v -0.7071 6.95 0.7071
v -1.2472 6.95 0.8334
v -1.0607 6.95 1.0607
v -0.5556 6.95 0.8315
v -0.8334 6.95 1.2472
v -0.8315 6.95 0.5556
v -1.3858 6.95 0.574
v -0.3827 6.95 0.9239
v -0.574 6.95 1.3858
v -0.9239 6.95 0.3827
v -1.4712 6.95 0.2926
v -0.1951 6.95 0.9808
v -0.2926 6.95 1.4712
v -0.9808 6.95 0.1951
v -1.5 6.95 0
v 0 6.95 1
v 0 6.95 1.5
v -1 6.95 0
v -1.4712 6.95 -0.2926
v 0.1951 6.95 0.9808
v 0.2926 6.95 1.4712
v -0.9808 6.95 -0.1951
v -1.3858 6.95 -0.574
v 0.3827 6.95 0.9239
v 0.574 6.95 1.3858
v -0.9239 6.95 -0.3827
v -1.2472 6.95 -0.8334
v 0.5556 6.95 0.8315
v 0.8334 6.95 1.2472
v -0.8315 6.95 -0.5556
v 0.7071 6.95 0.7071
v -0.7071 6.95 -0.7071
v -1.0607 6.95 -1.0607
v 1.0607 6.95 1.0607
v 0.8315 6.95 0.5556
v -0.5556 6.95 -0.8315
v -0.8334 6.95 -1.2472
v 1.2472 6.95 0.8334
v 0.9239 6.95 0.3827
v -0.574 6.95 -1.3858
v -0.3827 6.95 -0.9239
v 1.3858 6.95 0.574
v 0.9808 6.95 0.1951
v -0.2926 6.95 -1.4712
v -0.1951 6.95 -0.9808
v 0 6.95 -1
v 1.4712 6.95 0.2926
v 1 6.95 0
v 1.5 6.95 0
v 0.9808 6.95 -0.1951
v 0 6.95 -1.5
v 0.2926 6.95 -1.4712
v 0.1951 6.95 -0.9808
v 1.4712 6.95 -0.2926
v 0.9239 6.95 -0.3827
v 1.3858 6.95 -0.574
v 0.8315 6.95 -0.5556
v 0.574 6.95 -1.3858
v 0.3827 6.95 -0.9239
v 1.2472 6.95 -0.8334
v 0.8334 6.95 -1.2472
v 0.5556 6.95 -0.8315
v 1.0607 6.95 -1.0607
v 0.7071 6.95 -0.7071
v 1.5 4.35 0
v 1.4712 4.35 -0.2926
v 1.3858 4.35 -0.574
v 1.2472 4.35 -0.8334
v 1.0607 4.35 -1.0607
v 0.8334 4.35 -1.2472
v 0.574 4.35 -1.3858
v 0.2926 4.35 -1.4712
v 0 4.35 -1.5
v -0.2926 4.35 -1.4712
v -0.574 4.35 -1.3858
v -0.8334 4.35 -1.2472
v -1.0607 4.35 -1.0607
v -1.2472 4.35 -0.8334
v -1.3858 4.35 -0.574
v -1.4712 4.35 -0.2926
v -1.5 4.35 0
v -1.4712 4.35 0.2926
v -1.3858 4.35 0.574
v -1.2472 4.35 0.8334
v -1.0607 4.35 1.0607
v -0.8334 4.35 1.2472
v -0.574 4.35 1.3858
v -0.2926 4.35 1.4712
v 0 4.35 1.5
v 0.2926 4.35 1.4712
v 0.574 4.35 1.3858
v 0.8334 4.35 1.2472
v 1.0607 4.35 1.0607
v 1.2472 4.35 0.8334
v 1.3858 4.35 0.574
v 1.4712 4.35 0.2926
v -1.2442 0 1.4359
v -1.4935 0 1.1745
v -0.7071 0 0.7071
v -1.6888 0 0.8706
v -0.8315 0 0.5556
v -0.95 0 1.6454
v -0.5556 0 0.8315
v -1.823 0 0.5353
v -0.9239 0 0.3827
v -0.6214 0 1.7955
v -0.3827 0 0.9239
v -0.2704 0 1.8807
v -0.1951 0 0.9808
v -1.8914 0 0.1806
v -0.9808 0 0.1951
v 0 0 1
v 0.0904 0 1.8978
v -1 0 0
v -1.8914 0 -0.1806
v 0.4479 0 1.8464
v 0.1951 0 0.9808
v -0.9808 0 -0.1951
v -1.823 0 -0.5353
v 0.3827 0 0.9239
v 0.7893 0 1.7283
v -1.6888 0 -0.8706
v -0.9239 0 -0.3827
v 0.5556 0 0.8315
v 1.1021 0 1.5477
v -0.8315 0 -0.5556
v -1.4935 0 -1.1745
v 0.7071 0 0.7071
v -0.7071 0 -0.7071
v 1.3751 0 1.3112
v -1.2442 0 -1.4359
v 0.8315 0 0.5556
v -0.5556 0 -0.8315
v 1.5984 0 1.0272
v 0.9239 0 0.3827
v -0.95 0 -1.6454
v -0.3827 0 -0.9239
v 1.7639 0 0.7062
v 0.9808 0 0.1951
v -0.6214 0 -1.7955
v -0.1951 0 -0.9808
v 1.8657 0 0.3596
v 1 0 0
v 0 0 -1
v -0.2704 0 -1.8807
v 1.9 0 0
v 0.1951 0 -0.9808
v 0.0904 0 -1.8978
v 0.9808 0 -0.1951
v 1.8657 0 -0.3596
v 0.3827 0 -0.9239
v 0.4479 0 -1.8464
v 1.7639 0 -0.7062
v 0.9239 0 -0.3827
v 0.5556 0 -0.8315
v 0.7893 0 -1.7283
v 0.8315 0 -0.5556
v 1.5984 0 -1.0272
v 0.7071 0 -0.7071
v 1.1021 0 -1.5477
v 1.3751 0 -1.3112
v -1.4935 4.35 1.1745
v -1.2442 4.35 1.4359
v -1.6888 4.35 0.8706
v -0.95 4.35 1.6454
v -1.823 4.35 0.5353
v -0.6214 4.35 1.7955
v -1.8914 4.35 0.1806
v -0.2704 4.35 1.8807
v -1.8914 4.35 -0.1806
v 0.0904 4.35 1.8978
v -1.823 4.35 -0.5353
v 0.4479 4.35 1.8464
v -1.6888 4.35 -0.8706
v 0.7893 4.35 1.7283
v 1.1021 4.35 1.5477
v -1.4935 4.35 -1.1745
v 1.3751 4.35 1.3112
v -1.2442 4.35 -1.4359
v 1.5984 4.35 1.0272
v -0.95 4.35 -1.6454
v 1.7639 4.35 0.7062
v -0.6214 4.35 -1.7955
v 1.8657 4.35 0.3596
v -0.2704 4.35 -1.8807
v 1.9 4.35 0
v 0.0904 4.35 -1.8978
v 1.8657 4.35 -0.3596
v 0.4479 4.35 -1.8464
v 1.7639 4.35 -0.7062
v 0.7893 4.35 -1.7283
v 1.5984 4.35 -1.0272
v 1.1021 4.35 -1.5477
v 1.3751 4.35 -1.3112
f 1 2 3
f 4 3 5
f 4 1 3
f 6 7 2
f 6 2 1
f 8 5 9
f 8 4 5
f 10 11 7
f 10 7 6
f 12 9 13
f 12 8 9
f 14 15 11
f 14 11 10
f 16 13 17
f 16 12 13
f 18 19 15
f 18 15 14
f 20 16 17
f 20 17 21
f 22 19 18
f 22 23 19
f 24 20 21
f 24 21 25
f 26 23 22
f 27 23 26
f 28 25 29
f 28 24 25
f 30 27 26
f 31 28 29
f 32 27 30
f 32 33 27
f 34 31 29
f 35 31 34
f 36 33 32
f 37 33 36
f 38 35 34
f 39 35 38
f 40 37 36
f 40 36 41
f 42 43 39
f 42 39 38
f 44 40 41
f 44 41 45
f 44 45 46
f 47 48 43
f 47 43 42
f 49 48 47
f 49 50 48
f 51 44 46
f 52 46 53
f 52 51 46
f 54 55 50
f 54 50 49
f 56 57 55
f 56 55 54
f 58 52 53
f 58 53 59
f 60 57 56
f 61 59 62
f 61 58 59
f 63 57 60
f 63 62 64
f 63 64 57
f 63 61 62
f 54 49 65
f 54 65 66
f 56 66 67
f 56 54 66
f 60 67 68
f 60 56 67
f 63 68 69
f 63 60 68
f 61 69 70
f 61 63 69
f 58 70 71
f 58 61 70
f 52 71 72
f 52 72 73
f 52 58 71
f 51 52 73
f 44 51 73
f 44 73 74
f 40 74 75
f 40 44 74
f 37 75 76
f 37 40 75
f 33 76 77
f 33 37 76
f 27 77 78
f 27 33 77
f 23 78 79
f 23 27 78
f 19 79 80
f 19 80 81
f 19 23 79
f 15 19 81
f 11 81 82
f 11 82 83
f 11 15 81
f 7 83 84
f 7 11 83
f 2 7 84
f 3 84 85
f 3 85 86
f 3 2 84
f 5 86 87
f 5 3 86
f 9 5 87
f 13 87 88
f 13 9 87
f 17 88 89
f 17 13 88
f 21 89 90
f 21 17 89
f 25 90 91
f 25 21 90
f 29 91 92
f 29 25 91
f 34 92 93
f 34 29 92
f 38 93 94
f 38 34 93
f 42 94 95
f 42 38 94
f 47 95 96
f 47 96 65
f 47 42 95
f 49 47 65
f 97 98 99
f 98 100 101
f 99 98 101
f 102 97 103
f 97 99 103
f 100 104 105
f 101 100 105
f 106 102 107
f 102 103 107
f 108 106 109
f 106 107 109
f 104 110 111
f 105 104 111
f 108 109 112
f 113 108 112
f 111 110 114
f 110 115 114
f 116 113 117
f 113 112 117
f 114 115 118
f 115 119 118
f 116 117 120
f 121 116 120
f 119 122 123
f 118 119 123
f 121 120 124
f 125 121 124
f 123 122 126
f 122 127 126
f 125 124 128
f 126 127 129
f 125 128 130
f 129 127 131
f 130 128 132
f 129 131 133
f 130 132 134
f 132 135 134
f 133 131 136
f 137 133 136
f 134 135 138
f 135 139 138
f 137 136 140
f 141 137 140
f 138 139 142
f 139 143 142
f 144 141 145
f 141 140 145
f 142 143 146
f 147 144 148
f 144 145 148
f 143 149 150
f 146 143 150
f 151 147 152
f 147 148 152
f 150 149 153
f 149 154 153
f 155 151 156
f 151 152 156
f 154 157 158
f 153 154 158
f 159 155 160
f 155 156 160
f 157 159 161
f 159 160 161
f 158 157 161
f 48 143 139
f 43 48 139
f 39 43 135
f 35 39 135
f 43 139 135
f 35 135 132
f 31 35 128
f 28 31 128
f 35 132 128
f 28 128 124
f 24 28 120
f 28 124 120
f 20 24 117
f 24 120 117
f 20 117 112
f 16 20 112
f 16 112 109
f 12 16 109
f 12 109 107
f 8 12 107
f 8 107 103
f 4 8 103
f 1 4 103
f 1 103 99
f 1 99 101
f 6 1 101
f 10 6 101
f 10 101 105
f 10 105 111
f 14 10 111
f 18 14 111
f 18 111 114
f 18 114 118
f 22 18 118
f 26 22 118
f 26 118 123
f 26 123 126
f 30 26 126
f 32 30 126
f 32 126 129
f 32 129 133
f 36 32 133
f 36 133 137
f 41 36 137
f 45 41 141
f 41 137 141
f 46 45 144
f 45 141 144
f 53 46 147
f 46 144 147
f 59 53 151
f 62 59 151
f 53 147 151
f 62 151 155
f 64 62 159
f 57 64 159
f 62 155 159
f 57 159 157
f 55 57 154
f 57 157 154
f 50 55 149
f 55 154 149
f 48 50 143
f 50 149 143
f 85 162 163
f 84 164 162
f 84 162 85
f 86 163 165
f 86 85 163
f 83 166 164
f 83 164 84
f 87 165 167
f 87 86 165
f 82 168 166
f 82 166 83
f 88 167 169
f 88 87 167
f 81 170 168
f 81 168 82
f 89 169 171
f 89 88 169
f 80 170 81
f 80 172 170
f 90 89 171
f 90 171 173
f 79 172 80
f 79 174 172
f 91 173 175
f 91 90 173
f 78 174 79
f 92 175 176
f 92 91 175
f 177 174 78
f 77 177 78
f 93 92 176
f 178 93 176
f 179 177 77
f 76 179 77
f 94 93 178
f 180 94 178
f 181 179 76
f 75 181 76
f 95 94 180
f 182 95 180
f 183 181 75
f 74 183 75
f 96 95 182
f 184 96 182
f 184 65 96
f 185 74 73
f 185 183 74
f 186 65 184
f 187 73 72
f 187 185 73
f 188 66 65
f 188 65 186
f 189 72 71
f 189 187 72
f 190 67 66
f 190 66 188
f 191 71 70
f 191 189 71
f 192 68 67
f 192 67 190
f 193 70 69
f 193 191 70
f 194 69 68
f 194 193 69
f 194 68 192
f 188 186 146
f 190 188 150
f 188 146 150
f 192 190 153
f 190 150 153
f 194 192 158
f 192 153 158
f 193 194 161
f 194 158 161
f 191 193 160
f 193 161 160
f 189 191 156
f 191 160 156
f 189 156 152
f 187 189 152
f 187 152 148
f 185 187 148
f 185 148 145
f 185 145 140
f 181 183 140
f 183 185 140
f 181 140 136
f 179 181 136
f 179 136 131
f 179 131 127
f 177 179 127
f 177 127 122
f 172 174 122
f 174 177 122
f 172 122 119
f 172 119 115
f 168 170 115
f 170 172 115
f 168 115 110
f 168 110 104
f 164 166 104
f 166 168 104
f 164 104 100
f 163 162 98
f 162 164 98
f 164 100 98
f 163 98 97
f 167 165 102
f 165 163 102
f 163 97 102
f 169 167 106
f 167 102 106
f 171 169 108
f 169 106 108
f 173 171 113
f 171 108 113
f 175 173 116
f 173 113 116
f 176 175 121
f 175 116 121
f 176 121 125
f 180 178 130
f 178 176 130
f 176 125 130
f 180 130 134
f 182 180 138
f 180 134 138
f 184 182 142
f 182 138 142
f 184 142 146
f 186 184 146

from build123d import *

# Parameters (mm, degrees)
SKETCH1_R           = 1.9
BOSS_EXTRUDE1_DEPTH = 6.95
SKETCH2_OUTSIDE_W   = 7.558
SKETCH2_OUTSIDE_H   = 7.558
SKETCH2_OUTSIDE_R   = 1.5
CUT_EXTRUDE1_DEPTH  = 2.6
SKETCH3_R           = 1
CUT_EXTRUDE2_DEPTH  = 7.95


with BuildPart() as part:
    # Sketch1 → Boss-Extrude1 (new body)
    with BuildSketch(Plane(origin=(0, 0, 0), x_dir=(1, 0, 0), z_dir=(0, 1, 0))):
        Circle(SKETCH1_R)
    extrude(amount=BOSS_EXTRUDE1_DEPTH)

    # Sketch2 outside → Cut-Extrude1 (cut)
    with BuildSketch(Plane(origin=(0, 6.95, 0), x_dir=(1, 0, 0), z_dir=(0, 1, 0))):
        Rectangle(SKETCH2_OUTSIDE_W, SKETCH2_OUTSIDE_H)
        Circle(SKETCH2_OUTSIDE_R, mode=Mode.SUBTRACT)
    extrude(amount=-CUT_EXTRUDE1_DEPTH, mode=Mode.SUBTRACT)

    # Sketch3 → Cut-Extrude2 (cut, through all)
    with BuildSketch(Plane.XZ):
        Circle(SKETCH3_R)
    extrude(amount=-CUT_EXTRUDE2_DEPTH, mode=Mode.SUBTRACT)


solid = part.part
